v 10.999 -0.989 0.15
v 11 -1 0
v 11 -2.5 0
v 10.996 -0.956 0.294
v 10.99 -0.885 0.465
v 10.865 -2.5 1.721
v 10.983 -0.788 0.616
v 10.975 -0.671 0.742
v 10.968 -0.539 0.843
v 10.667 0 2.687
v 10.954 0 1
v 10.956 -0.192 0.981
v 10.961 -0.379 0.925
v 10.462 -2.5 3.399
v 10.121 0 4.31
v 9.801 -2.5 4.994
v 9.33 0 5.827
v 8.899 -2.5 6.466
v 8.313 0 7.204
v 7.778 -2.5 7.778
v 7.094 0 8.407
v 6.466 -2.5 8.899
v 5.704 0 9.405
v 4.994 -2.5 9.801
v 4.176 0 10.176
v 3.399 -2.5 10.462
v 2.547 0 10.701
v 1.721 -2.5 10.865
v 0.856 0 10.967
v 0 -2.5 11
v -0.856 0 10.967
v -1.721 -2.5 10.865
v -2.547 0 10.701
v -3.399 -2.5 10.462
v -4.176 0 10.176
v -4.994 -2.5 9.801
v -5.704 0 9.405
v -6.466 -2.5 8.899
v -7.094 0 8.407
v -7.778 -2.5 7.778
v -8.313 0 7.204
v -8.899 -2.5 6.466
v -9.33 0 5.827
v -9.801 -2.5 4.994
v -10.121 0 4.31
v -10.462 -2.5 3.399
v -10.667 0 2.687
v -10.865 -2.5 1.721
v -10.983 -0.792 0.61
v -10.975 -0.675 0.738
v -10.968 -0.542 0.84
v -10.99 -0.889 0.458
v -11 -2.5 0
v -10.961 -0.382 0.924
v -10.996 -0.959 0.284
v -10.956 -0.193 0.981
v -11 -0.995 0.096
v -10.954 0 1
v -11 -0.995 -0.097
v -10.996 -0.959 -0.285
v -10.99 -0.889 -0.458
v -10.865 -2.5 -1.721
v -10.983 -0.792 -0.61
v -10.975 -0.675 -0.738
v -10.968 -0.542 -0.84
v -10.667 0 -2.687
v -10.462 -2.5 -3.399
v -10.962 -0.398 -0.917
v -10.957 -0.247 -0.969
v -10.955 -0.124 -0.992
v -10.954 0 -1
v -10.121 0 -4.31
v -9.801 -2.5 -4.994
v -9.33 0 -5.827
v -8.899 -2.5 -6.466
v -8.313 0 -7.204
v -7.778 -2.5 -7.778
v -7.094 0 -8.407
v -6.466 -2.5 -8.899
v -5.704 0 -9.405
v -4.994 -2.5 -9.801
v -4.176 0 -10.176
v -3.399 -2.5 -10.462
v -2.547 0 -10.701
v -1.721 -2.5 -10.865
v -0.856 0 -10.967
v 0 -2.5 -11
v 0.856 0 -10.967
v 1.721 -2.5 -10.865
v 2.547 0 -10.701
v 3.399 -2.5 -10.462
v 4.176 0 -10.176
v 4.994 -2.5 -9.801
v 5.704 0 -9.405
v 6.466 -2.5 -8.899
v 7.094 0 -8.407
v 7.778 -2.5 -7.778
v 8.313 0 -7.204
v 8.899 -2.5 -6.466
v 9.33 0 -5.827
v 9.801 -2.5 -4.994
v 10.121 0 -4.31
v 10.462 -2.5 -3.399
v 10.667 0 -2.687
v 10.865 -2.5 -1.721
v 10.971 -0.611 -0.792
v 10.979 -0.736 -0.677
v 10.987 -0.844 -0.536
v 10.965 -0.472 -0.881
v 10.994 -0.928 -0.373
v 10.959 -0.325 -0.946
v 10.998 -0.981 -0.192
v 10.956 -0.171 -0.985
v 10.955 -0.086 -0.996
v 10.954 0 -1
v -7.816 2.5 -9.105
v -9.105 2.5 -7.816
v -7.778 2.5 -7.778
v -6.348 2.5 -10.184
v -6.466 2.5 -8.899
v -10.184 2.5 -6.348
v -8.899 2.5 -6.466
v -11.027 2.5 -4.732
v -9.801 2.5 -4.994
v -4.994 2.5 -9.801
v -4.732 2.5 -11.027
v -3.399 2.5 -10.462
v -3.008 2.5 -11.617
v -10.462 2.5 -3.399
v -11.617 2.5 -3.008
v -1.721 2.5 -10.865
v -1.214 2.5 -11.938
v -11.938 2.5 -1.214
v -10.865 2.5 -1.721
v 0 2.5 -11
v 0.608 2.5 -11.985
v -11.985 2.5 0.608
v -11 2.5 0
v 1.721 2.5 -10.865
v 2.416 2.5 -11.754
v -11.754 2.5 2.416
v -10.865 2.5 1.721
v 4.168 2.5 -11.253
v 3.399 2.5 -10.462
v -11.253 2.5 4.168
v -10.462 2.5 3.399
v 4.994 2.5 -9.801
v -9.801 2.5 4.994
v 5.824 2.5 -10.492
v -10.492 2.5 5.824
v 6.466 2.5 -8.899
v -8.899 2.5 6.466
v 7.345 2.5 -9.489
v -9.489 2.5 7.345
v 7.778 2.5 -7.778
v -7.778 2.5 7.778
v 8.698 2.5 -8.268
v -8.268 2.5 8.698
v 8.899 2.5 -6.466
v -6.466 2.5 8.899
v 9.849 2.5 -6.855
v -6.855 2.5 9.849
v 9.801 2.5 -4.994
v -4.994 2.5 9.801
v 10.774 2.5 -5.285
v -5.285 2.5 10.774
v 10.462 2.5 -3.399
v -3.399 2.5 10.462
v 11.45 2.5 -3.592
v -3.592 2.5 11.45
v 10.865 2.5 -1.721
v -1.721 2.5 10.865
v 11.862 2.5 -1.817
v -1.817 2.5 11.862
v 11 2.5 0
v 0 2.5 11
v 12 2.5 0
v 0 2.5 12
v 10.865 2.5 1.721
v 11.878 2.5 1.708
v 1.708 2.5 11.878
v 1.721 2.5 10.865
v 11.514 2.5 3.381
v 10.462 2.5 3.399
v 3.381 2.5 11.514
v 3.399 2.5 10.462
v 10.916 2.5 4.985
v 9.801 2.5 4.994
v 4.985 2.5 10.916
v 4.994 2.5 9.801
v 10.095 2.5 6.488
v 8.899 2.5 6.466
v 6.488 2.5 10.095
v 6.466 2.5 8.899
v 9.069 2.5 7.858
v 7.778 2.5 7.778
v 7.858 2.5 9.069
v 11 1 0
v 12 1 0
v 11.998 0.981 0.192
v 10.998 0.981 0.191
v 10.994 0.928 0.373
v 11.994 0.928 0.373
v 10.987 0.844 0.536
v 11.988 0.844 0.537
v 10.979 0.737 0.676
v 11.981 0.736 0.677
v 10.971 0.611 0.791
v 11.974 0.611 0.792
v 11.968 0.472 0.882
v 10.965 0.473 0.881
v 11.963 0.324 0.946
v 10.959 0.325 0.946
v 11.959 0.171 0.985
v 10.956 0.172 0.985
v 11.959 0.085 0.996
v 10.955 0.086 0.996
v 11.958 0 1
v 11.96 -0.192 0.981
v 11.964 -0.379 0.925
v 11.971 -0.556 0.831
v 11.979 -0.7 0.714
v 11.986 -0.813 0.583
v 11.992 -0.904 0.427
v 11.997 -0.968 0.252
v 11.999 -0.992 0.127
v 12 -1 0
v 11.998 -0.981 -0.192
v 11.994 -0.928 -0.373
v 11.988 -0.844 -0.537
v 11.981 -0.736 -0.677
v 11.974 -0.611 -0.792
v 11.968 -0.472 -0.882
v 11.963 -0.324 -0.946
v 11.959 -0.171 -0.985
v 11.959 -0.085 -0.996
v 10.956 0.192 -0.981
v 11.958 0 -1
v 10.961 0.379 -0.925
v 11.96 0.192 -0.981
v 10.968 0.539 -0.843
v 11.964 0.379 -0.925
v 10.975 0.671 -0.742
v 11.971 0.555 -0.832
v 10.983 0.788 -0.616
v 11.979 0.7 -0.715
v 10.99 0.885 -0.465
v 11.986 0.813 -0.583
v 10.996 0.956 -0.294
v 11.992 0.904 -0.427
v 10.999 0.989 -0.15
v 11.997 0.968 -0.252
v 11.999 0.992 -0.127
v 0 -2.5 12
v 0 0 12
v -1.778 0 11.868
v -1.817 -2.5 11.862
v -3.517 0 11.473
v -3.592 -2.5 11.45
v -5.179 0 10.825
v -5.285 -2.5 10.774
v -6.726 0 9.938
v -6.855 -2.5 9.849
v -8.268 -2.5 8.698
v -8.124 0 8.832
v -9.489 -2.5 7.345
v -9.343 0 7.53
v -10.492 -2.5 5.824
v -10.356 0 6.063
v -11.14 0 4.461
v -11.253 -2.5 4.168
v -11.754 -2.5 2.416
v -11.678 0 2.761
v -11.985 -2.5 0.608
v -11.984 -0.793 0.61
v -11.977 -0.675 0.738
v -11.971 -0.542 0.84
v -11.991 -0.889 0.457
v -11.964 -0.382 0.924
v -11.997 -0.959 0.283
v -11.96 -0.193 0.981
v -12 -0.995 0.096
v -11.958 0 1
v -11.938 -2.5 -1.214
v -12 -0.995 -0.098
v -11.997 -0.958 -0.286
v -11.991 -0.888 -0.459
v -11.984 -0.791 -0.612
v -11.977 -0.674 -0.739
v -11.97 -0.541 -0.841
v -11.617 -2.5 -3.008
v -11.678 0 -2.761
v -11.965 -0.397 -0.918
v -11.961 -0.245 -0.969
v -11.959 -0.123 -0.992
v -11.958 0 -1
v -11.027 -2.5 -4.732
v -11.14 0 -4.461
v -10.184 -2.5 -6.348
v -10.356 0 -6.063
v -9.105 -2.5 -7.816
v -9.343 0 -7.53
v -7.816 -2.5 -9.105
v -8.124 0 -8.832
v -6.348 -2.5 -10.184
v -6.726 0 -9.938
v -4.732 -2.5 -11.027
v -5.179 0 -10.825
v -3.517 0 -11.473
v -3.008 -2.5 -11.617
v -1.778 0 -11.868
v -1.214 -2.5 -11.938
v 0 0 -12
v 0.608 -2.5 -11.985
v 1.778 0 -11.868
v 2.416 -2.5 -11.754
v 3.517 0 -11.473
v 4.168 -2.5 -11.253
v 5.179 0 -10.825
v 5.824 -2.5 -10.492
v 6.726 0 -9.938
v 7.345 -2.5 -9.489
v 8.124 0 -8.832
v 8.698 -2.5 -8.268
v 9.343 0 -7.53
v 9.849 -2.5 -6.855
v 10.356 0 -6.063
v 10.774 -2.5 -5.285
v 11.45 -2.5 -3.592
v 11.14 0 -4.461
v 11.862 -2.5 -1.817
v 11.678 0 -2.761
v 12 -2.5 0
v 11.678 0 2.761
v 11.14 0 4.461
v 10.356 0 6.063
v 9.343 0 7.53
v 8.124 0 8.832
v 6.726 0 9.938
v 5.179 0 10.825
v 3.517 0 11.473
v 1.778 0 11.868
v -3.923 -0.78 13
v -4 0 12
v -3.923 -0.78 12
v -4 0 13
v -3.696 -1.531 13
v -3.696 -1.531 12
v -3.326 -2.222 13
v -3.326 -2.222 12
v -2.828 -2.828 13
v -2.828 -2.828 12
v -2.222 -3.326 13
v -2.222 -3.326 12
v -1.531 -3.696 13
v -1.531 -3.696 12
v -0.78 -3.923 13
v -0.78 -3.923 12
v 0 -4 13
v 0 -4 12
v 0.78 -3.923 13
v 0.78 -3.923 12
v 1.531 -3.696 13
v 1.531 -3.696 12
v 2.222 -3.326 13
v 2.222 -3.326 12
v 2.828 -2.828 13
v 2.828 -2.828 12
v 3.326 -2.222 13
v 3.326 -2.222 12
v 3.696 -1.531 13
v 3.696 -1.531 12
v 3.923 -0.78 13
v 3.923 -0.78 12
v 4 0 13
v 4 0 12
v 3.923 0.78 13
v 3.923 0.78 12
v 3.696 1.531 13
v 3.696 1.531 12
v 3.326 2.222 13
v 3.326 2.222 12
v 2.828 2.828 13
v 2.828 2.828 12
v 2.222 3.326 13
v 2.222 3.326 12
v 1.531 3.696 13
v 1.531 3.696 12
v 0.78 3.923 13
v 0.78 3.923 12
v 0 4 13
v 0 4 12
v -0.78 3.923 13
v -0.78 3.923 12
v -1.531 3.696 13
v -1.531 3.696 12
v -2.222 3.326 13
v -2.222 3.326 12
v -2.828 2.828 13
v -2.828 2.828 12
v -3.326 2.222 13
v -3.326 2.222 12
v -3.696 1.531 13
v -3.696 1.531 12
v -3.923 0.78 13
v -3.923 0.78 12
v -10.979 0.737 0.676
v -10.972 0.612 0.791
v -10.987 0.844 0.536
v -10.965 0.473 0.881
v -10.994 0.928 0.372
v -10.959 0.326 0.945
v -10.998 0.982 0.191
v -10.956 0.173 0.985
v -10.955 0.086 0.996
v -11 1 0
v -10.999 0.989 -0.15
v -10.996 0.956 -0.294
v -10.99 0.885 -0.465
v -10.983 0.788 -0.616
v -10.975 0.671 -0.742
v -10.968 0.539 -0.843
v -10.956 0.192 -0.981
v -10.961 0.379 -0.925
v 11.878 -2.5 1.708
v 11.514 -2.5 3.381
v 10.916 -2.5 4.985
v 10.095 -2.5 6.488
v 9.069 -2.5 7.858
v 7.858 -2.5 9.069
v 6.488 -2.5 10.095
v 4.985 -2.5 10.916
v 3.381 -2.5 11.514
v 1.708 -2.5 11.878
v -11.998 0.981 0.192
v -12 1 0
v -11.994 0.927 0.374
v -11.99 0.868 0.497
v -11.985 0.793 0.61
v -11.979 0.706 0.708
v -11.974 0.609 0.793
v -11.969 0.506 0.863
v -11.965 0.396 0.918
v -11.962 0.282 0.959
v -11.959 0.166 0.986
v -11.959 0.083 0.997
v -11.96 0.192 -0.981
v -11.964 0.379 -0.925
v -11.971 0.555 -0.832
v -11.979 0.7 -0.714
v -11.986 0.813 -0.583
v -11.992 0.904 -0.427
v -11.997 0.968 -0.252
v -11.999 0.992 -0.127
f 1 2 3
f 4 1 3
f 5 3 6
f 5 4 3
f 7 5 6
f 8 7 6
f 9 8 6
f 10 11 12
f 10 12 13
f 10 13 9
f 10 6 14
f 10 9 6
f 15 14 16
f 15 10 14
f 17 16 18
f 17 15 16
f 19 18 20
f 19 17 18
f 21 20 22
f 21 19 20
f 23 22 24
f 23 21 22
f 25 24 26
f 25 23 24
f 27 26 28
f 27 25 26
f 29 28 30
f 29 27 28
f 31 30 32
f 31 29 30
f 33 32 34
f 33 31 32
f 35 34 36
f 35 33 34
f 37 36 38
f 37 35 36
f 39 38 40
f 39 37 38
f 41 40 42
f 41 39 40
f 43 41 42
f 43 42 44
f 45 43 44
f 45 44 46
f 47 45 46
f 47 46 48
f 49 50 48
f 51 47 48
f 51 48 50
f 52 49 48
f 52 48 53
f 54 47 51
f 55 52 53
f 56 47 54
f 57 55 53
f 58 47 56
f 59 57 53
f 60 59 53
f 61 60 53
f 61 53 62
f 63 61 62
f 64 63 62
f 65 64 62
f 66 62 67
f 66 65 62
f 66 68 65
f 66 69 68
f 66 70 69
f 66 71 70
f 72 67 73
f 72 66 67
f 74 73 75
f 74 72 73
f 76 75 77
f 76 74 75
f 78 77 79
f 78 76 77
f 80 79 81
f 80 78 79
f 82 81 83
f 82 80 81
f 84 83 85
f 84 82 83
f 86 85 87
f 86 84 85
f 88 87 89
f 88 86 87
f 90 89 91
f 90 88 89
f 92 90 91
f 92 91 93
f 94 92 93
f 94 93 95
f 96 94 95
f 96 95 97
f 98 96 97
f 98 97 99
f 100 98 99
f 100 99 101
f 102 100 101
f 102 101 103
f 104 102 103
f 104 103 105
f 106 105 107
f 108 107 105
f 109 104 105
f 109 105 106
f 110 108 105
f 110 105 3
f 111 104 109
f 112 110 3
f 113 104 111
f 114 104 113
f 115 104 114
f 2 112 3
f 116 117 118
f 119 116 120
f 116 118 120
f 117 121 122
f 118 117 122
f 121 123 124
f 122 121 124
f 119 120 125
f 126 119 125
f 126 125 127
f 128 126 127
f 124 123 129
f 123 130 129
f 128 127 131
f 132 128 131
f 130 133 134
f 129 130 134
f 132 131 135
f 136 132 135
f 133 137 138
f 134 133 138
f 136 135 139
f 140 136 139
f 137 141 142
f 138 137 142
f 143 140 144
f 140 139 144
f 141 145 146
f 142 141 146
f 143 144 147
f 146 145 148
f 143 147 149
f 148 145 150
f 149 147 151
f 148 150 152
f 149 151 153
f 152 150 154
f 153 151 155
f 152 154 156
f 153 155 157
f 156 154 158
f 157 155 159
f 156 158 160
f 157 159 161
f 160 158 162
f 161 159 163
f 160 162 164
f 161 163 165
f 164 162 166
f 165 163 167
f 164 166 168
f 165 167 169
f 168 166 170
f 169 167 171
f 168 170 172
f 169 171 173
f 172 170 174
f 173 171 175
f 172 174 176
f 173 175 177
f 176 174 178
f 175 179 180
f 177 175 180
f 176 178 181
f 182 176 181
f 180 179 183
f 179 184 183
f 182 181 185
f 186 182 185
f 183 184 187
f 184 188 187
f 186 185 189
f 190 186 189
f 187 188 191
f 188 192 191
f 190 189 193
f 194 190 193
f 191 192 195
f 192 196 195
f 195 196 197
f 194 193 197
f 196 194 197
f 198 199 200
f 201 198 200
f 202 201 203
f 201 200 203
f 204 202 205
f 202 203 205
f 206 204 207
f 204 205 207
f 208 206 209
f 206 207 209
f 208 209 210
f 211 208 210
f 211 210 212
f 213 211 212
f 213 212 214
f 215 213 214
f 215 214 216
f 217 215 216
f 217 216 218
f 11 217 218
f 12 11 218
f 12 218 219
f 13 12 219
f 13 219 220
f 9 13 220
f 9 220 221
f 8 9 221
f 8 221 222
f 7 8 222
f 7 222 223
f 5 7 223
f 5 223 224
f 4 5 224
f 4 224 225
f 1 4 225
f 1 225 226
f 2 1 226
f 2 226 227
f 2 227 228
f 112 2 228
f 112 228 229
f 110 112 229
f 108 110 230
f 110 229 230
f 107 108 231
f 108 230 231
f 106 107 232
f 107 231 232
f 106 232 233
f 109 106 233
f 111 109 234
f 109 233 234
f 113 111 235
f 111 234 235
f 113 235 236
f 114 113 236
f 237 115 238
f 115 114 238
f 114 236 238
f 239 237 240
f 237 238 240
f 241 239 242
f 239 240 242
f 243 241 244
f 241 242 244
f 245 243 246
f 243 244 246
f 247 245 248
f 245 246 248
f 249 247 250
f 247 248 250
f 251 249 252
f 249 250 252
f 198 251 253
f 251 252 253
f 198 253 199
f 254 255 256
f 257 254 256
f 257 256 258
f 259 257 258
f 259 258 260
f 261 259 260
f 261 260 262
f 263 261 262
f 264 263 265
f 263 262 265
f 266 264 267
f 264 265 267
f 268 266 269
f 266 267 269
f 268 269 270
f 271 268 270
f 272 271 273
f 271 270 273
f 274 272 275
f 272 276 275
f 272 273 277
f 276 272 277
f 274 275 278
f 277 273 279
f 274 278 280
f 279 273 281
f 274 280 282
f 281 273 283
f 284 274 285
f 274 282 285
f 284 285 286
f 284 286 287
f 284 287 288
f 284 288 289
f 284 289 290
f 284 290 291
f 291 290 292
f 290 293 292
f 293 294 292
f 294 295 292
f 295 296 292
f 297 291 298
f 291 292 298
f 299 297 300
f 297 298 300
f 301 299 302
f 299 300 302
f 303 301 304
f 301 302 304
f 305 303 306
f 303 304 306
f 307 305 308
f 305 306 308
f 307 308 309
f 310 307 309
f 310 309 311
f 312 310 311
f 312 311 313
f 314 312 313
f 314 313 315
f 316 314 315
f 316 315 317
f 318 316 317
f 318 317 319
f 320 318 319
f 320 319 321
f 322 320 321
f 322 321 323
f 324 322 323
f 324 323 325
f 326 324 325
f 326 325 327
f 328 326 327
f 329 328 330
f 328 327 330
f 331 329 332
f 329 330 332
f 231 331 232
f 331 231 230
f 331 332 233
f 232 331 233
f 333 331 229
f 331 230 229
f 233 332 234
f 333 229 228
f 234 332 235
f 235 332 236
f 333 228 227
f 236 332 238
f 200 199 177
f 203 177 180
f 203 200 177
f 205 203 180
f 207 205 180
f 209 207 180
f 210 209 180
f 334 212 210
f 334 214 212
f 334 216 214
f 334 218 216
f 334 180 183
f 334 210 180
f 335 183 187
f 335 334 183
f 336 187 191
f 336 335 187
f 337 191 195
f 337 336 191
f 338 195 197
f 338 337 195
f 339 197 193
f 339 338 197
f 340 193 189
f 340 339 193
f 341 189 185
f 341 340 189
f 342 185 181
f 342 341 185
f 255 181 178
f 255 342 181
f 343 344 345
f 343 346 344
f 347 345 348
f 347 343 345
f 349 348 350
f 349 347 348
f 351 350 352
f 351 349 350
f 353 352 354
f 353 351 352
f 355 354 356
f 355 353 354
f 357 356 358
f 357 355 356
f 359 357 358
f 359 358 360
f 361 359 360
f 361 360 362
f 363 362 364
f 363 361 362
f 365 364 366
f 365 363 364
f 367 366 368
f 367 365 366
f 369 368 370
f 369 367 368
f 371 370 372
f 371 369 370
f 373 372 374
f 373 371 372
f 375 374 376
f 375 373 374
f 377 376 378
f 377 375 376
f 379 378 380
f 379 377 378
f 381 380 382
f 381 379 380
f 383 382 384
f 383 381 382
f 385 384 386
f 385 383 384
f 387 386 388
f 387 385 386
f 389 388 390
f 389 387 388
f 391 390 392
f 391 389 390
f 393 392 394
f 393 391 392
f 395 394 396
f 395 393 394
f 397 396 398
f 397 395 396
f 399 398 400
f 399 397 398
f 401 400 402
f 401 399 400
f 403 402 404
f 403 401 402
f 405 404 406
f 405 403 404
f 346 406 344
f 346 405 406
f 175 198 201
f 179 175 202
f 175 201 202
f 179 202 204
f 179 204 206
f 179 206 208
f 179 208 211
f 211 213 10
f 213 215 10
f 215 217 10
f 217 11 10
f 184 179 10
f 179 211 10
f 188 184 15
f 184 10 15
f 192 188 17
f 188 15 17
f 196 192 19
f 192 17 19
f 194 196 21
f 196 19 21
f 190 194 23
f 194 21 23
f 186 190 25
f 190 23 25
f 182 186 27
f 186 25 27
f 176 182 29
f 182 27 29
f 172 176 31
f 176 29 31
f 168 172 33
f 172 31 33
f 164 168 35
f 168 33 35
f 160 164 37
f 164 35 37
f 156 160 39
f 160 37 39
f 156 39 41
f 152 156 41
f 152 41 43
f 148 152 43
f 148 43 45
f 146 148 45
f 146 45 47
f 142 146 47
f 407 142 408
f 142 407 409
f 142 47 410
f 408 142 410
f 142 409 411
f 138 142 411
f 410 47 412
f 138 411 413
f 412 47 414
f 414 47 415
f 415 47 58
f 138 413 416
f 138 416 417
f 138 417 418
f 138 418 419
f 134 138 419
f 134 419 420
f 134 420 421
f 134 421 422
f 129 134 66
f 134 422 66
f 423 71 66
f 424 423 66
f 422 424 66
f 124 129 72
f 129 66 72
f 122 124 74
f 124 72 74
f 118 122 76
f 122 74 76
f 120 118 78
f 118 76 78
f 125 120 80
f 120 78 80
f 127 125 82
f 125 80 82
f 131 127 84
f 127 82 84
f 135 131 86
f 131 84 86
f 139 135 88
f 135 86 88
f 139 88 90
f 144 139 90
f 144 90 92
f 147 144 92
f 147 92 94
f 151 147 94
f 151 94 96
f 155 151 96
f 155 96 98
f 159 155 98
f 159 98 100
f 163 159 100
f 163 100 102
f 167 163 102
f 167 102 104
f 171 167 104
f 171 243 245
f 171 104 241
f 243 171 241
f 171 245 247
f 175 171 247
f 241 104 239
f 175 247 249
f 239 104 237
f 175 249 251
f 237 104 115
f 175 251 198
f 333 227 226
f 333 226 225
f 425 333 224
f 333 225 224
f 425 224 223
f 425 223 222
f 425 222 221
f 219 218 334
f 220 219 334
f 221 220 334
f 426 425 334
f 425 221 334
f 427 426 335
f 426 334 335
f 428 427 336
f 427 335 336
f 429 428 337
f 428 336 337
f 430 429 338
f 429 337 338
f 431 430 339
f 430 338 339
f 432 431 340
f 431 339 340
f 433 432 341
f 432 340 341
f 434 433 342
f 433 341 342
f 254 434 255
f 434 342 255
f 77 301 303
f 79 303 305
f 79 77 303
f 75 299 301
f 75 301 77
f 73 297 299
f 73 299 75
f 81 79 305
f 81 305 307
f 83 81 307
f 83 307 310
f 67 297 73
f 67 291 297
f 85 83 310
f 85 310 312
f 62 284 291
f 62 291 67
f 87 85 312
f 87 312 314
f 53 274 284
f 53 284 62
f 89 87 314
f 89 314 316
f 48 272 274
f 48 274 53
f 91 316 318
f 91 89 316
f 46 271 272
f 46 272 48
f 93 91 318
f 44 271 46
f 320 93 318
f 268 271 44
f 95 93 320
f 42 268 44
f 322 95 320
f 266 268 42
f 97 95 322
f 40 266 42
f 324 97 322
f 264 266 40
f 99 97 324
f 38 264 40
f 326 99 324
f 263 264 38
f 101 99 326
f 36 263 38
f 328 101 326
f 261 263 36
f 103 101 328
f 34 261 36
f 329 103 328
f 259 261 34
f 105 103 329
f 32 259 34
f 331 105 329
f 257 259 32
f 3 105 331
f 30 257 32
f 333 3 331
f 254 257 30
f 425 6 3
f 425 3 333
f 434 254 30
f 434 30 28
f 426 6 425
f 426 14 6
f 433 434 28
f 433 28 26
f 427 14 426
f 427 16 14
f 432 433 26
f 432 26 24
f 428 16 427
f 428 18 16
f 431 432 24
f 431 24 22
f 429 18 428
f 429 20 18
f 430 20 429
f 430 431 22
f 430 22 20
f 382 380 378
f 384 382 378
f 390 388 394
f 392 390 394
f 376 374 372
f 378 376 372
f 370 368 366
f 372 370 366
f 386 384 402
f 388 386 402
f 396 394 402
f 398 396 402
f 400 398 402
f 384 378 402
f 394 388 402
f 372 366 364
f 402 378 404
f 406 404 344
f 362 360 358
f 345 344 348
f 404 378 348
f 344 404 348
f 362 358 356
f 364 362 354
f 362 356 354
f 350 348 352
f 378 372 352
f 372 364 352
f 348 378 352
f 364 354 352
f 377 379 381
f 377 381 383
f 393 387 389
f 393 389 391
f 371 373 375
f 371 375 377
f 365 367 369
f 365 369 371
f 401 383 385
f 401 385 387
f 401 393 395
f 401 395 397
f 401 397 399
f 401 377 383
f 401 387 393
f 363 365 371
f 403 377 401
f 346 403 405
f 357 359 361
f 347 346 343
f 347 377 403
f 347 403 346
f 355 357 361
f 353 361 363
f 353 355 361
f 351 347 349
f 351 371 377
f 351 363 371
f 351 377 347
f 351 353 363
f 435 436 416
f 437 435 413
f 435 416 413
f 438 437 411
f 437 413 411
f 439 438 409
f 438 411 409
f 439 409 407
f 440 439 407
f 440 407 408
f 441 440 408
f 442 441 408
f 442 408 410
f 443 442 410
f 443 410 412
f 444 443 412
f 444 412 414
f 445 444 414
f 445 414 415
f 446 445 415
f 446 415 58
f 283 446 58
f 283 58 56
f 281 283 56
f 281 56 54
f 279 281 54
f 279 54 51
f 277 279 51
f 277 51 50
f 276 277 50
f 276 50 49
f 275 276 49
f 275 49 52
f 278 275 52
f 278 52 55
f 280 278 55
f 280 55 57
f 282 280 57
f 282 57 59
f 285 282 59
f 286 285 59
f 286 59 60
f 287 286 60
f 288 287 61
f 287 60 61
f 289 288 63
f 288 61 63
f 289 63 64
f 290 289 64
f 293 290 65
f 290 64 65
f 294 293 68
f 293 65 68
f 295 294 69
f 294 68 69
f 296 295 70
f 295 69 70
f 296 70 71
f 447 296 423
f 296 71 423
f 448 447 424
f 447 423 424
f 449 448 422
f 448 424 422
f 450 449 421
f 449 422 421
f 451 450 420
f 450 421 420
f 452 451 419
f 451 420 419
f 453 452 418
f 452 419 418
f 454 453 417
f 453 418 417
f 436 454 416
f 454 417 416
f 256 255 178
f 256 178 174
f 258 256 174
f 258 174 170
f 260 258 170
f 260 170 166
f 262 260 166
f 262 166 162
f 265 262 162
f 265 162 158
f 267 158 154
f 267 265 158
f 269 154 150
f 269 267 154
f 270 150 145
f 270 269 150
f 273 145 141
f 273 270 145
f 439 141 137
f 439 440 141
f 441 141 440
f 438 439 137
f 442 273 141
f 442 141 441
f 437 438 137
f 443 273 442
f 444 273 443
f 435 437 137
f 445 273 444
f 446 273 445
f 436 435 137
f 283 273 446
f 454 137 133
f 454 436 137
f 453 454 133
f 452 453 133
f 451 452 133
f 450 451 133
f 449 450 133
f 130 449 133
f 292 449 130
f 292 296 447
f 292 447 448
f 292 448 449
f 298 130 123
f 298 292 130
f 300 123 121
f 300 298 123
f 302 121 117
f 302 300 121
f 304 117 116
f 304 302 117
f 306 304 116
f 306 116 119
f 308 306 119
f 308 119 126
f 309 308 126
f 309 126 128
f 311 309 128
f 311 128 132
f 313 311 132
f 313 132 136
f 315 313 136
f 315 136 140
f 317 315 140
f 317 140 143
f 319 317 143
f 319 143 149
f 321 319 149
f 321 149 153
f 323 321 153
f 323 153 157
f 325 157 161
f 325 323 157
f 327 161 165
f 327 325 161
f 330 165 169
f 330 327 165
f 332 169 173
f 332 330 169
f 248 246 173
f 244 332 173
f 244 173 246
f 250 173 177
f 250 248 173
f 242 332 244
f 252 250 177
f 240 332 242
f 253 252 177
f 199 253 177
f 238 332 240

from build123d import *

# Parameters (mm, degrees)
F1_R     = 11
F2_DEPTH = 2.5
F1_W     = 4
F1_H     = 1
F4_R     = 1
F5_DEPTH = 30


with BuildPart() as f2:
    # F1 (on Front) → F2 (new body, symmetric)
    with BuildSketch(Plane.XZ):
        with BuildLine():
            ThreePointArc((0, 12), (-8.4852813742, -8.4852813742), (12, 0))
            ThreePointArc((12, 0), (8.4852813742, 8.4852813742), (0, 12))
        make_face()
        Circle(F1_R, mode=Mode.SUBTRACT)
    extrude(amount=F2_DEPTH, both=True)

    # F4 (on Right) → F5 (cut, symmetric)
    with BuildSketch(Plane.YZ):
        Circle(F4_R)
    extrude(amount=F5_DEPTH, both=True, mode=Mode.SUBTRACT)


with BuildPart() as f3:
    # F1 (on Front) → F3 (revolve)
    with BuildSketch(Plane.XZ):
        with Locations((-2, 12.5)):
            Rectangle(F1_W, F1_H)
    revolve(axis=Axis((0, 0, 12.5), (0, 0, 1)))


solid = Compound([f2.part, f3.part])
